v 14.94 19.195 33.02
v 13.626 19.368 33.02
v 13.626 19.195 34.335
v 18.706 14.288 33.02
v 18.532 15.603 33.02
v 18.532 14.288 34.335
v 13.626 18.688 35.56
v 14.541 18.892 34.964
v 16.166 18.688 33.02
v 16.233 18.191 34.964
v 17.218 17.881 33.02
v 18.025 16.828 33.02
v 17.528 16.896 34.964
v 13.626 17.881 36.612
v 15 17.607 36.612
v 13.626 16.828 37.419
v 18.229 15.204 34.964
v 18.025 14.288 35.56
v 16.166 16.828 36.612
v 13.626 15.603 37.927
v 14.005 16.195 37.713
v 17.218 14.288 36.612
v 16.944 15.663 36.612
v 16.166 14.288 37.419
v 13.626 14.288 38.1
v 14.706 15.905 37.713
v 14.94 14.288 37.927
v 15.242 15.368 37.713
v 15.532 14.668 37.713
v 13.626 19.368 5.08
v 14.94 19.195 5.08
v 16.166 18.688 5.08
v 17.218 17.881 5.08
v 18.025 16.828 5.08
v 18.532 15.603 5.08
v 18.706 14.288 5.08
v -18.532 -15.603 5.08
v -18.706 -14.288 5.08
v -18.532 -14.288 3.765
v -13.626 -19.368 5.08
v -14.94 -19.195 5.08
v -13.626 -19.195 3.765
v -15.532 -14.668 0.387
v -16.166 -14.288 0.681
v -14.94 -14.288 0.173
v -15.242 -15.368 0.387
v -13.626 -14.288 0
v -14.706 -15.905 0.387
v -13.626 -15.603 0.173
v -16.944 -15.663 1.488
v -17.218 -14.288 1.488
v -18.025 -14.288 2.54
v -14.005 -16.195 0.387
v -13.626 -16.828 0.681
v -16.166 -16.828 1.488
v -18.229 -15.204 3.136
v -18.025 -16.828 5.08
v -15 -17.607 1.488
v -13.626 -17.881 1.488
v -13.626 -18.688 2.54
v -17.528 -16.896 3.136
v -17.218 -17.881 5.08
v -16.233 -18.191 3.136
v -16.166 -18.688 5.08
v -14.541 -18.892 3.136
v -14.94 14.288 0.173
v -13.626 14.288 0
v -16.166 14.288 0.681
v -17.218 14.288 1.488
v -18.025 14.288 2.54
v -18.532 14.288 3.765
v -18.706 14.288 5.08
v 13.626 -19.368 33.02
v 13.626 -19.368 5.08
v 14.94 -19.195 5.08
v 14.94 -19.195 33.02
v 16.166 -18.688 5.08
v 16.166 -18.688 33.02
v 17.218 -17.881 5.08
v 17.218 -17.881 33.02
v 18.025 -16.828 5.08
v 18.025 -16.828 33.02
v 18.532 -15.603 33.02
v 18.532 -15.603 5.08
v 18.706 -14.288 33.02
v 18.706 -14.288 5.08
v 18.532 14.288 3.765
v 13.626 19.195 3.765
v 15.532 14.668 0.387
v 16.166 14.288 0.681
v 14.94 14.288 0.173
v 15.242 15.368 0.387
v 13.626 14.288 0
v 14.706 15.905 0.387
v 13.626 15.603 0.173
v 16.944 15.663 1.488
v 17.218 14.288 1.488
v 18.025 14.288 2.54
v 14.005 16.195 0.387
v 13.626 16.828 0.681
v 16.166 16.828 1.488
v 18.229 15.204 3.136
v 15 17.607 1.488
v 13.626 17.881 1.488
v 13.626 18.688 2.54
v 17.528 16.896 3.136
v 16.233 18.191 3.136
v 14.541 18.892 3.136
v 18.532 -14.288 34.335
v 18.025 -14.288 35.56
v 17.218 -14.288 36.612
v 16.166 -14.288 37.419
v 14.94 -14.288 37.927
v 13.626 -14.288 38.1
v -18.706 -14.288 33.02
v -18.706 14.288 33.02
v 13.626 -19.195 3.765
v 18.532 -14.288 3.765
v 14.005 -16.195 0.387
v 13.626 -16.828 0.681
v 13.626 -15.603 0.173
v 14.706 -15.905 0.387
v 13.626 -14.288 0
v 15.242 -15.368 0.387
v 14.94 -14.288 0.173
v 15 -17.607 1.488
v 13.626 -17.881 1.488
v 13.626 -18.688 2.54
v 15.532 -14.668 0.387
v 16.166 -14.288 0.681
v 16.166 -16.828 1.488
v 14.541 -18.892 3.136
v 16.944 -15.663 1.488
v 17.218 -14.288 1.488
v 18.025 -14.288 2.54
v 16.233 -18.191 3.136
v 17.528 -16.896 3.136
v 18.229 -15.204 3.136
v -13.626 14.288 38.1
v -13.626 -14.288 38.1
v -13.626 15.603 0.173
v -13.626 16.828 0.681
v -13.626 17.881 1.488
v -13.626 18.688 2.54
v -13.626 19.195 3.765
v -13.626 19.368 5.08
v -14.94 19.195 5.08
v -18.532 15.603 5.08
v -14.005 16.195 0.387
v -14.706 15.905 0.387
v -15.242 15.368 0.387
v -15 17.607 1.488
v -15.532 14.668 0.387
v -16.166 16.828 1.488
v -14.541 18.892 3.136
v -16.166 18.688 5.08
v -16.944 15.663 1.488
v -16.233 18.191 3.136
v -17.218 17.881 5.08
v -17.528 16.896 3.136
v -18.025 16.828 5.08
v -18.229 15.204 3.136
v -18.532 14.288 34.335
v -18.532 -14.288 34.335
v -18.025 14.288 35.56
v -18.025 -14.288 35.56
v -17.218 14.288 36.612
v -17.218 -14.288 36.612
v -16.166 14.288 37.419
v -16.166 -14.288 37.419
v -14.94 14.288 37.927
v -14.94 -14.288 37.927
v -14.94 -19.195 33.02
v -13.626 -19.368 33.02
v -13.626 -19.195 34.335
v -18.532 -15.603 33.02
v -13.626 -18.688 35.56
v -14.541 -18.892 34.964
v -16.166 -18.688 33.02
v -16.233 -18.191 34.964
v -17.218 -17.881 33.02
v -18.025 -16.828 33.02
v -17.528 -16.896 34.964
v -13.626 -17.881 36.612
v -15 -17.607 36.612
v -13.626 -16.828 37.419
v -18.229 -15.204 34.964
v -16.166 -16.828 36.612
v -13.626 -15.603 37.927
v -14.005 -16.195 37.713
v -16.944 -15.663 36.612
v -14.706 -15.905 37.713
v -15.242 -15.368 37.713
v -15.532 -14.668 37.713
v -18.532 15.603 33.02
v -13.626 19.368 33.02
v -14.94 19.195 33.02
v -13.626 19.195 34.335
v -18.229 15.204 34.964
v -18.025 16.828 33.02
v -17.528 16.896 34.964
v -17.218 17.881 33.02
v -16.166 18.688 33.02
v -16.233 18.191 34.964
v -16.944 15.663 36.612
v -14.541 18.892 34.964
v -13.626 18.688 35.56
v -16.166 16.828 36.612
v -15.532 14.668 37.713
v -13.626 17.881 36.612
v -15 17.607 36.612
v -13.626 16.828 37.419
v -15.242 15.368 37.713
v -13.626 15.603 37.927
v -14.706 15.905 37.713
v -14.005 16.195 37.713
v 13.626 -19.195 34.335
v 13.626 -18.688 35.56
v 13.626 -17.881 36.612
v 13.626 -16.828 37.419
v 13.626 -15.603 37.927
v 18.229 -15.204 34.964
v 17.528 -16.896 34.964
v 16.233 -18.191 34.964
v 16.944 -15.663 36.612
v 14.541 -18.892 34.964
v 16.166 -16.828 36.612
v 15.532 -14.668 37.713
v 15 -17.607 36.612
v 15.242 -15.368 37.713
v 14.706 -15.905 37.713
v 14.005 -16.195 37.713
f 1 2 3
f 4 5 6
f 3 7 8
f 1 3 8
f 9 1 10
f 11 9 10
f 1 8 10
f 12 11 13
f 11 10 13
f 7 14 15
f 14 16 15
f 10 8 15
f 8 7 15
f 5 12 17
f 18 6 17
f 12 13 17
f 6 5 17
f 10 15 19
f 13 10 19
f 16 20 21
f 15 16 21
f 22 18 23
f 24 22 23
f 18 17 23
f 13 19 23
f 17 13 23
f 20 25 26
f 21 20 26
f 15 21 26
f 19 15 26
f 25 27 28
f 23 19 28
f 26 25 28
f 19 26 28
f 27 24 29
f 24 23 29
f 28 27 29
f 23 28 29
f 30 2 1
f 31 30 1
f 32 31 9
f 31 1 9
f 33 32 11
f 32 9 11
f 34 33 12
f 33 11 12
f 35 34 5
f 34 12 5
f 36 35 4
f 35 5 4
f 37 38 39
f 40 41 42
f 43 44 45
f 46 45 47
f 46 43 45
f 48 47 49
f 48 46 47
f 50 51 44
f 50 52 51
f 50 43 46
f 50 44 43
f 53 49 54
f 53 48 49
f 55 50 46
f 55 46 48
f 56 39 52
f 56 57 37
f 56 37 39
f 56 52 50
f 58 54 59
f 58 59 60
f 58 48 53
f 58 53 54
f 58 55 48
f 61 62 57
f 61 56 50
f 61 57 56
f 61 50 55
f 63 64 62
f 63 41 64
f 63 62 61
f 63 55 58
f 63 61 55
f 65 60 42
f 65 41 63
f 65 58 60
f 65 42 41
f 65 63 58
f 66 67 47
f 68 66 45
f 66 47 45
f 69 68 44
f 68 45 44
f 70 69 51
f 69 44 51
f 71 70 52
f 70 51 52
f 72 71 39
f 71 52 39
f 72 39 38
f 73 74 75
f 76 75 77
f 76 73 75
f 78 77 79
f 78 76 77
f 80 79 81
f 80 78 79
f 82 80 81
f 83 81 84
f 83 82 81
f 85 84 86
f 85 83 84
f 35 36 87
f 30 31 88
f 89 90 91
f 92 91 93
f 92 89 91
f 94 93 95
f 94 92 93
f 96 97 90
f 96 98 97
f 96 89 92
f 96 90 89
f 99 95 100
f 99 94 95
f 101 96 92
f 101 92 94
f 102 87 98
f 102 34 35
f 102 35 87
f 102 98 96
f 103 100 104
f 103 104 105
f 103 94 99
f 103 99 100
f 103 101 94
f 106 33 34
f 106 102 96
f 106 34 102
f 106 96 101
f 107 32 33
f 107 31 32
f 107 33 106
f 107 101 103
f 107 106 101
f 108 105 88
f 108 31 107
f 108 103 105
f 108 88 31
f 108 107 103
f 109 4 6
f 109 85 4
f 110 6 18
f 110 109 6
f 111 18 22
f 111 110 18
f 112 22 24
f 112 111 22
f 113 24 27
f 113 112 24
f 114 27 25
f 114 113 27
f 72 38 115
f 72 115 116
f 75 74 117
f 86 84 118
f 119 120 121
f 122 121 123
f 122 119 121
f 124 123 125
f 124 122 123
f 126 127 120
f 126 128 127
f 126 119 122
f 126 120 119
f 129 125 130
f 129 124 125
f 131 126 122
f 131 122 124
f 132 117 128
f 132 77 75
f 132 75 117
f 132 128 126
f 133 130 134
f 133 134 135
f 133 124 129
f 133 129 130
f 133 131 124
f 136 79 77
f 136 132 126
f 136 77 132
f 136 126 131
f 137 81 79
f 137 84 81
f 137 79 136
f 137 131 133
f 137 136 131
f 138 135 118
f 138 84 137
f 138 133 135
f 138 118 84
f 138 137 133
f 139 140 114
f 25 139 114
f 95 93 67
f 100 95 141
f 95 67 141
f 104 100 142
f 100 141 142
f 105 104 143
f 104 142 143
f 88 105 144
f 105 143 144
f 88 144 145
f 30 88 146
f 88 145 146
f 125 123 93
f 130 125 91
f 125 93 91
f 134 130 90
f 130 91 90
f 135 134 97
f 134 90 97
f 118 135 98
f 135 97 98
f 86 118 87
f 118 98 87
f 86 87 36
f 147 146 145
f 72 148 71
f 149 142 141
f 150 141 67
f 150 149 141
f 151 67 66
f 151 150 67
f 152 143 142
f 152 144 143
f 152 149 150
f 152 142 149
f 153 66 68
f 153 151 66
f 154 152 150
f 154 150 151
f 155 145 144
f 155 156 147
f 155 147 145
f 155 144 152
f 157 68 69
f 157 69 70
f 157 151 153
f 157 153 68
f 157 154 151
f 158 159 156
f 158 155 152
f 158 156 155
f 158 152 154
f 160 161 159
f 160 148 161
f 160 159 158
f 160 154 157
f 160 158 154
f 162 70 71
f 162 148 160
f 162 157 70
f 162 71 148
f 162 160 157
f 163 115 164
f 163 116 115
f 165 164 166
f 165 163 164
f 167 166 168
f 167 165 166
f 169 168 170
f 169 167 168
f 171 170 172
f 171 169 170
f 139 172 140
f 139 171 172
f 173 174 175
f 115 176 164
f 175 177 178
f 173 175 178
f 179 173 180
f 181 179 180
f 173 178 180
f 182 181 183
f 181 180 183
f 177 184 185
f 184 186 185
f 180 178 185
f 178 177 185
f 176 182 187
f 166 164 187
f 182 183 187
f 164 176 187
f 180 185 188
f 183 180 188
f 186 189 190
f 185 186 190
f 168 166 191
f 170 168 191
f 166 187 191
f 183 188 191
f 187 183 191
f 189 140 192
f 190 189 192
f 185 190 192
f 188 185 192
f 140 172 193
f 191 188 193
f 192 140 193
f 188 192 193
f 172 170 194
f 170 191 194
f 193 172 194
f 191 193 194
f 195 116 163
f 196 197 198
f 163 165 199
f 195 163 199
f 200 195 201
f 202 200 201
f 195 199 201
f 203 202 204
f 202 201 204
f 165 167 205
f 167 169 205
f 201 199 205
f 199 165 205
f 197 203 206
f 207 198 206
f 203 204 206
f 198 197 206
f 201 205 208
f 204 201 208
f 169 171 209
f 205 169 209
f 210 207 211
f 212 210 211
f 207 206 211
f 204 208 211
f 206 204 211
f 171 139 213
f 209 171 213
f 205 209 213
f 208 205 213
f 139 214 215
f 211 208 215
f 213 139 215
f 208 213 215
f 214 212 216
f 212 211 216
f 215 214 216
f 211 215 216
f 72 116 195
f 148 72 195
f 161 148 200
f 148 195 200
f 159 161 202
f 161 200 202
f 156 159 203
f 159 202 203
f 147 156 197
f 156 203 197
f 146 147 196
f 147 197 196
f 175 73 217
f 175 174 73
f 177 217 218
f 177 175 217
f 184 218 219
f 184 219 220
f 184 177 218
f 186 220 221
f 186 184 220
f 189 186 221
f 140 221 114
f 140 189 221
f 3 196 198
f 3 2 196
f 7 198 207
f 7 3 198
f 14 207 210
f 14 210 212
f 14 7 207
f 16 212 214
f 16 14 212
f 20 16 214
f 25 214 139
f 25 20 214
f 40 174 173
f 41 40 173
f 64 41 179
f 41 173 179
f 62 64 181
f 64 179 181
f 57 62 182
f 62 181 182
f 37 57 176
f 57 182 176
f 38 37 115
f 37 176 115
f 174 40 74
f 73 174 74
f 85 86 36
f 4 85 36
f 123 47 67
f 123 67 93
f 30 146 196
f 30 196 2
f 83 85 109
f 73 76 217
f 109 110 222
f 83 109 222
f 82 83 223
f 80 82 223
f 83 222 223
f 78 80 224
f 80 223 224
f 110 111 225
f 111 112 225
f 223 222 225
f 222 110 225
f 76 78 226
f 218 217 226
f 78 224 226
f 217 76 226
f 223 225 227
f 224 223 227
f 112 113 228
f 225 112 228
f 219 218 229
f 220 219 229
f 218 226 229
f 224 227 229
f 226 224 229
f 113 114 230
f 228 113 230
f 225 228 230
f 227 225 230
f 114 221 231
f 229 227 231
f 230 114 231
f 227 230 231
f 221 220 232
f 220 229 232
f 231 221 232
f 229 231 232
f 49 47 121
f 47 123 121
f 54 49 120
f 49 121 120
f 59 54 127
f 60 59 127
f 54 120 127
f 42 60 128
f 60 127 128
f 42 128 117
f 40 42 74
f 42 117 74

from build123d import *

# Parameters (mm, degrees)
F0_W     = 37.4110154808
F0_H     = 38.7368313968
F1_DEPTH = 38.1
F2_R     = 5.08
F3_R     = 5.08
F4_R     = 5.08
F5_R     = 5.08
F6_R     = 5.08
F7_R     = 5.08


# Not quite as in the source:
# - the program builds the solid bodies; features that only make, move or delete a surface that nothing else refers to are left out


with BuildPart() as f1:
    # F0 (on Top) → F1 (new body)
    with BuildSketch(Plane.XY):
        Rectangle(F0_W, F0_H)
    extrude(amount=F1_DEPTH)

    # F2
    f2_edges = [f1.edges().sort_by_distance(p)[0] for p in [
        (18.705508, -19.368416, 19.05),
    ]]
    fillet(f2_edges, radius=F2_R)

    # F3
    f3_edges = [f1.edges().sort_by_distance(p)[0] for p in [
        (-18.705508, -19.368416, 19.05),
    ]]
    fillet(f3_edges, radius=F3_R)

    # F4
    f4_edges = [f1.edges().sort_by_distance(p)[0] for p in [
        (-18.705508, 19.368416, 19.05),
    ]]
    fillet(f4_edges, radius=F4_R)

    # F5
    f5_edges = [f1.edges().sort_by_distance(p)[0] for p in [
        (18.705508, 19.368416, 19.05),
    ]]
    fillet(f5_edges, radius=F5_R)

    # F6
    f6_edges = [f1.edges().sort_by_distance(p)[0] for p in [
        (0, 19.368416, 38.1),
    ]]
    fillet(f6_edges, radius=F6_R)

    # F7
    f7_edges = [f1.edges().sort_by_distance(p)[0] for p in [
        (0, -19.368416, 0),
    ]]
    fillet(f7_edges, radius=F7_R)


solid = f1.part
